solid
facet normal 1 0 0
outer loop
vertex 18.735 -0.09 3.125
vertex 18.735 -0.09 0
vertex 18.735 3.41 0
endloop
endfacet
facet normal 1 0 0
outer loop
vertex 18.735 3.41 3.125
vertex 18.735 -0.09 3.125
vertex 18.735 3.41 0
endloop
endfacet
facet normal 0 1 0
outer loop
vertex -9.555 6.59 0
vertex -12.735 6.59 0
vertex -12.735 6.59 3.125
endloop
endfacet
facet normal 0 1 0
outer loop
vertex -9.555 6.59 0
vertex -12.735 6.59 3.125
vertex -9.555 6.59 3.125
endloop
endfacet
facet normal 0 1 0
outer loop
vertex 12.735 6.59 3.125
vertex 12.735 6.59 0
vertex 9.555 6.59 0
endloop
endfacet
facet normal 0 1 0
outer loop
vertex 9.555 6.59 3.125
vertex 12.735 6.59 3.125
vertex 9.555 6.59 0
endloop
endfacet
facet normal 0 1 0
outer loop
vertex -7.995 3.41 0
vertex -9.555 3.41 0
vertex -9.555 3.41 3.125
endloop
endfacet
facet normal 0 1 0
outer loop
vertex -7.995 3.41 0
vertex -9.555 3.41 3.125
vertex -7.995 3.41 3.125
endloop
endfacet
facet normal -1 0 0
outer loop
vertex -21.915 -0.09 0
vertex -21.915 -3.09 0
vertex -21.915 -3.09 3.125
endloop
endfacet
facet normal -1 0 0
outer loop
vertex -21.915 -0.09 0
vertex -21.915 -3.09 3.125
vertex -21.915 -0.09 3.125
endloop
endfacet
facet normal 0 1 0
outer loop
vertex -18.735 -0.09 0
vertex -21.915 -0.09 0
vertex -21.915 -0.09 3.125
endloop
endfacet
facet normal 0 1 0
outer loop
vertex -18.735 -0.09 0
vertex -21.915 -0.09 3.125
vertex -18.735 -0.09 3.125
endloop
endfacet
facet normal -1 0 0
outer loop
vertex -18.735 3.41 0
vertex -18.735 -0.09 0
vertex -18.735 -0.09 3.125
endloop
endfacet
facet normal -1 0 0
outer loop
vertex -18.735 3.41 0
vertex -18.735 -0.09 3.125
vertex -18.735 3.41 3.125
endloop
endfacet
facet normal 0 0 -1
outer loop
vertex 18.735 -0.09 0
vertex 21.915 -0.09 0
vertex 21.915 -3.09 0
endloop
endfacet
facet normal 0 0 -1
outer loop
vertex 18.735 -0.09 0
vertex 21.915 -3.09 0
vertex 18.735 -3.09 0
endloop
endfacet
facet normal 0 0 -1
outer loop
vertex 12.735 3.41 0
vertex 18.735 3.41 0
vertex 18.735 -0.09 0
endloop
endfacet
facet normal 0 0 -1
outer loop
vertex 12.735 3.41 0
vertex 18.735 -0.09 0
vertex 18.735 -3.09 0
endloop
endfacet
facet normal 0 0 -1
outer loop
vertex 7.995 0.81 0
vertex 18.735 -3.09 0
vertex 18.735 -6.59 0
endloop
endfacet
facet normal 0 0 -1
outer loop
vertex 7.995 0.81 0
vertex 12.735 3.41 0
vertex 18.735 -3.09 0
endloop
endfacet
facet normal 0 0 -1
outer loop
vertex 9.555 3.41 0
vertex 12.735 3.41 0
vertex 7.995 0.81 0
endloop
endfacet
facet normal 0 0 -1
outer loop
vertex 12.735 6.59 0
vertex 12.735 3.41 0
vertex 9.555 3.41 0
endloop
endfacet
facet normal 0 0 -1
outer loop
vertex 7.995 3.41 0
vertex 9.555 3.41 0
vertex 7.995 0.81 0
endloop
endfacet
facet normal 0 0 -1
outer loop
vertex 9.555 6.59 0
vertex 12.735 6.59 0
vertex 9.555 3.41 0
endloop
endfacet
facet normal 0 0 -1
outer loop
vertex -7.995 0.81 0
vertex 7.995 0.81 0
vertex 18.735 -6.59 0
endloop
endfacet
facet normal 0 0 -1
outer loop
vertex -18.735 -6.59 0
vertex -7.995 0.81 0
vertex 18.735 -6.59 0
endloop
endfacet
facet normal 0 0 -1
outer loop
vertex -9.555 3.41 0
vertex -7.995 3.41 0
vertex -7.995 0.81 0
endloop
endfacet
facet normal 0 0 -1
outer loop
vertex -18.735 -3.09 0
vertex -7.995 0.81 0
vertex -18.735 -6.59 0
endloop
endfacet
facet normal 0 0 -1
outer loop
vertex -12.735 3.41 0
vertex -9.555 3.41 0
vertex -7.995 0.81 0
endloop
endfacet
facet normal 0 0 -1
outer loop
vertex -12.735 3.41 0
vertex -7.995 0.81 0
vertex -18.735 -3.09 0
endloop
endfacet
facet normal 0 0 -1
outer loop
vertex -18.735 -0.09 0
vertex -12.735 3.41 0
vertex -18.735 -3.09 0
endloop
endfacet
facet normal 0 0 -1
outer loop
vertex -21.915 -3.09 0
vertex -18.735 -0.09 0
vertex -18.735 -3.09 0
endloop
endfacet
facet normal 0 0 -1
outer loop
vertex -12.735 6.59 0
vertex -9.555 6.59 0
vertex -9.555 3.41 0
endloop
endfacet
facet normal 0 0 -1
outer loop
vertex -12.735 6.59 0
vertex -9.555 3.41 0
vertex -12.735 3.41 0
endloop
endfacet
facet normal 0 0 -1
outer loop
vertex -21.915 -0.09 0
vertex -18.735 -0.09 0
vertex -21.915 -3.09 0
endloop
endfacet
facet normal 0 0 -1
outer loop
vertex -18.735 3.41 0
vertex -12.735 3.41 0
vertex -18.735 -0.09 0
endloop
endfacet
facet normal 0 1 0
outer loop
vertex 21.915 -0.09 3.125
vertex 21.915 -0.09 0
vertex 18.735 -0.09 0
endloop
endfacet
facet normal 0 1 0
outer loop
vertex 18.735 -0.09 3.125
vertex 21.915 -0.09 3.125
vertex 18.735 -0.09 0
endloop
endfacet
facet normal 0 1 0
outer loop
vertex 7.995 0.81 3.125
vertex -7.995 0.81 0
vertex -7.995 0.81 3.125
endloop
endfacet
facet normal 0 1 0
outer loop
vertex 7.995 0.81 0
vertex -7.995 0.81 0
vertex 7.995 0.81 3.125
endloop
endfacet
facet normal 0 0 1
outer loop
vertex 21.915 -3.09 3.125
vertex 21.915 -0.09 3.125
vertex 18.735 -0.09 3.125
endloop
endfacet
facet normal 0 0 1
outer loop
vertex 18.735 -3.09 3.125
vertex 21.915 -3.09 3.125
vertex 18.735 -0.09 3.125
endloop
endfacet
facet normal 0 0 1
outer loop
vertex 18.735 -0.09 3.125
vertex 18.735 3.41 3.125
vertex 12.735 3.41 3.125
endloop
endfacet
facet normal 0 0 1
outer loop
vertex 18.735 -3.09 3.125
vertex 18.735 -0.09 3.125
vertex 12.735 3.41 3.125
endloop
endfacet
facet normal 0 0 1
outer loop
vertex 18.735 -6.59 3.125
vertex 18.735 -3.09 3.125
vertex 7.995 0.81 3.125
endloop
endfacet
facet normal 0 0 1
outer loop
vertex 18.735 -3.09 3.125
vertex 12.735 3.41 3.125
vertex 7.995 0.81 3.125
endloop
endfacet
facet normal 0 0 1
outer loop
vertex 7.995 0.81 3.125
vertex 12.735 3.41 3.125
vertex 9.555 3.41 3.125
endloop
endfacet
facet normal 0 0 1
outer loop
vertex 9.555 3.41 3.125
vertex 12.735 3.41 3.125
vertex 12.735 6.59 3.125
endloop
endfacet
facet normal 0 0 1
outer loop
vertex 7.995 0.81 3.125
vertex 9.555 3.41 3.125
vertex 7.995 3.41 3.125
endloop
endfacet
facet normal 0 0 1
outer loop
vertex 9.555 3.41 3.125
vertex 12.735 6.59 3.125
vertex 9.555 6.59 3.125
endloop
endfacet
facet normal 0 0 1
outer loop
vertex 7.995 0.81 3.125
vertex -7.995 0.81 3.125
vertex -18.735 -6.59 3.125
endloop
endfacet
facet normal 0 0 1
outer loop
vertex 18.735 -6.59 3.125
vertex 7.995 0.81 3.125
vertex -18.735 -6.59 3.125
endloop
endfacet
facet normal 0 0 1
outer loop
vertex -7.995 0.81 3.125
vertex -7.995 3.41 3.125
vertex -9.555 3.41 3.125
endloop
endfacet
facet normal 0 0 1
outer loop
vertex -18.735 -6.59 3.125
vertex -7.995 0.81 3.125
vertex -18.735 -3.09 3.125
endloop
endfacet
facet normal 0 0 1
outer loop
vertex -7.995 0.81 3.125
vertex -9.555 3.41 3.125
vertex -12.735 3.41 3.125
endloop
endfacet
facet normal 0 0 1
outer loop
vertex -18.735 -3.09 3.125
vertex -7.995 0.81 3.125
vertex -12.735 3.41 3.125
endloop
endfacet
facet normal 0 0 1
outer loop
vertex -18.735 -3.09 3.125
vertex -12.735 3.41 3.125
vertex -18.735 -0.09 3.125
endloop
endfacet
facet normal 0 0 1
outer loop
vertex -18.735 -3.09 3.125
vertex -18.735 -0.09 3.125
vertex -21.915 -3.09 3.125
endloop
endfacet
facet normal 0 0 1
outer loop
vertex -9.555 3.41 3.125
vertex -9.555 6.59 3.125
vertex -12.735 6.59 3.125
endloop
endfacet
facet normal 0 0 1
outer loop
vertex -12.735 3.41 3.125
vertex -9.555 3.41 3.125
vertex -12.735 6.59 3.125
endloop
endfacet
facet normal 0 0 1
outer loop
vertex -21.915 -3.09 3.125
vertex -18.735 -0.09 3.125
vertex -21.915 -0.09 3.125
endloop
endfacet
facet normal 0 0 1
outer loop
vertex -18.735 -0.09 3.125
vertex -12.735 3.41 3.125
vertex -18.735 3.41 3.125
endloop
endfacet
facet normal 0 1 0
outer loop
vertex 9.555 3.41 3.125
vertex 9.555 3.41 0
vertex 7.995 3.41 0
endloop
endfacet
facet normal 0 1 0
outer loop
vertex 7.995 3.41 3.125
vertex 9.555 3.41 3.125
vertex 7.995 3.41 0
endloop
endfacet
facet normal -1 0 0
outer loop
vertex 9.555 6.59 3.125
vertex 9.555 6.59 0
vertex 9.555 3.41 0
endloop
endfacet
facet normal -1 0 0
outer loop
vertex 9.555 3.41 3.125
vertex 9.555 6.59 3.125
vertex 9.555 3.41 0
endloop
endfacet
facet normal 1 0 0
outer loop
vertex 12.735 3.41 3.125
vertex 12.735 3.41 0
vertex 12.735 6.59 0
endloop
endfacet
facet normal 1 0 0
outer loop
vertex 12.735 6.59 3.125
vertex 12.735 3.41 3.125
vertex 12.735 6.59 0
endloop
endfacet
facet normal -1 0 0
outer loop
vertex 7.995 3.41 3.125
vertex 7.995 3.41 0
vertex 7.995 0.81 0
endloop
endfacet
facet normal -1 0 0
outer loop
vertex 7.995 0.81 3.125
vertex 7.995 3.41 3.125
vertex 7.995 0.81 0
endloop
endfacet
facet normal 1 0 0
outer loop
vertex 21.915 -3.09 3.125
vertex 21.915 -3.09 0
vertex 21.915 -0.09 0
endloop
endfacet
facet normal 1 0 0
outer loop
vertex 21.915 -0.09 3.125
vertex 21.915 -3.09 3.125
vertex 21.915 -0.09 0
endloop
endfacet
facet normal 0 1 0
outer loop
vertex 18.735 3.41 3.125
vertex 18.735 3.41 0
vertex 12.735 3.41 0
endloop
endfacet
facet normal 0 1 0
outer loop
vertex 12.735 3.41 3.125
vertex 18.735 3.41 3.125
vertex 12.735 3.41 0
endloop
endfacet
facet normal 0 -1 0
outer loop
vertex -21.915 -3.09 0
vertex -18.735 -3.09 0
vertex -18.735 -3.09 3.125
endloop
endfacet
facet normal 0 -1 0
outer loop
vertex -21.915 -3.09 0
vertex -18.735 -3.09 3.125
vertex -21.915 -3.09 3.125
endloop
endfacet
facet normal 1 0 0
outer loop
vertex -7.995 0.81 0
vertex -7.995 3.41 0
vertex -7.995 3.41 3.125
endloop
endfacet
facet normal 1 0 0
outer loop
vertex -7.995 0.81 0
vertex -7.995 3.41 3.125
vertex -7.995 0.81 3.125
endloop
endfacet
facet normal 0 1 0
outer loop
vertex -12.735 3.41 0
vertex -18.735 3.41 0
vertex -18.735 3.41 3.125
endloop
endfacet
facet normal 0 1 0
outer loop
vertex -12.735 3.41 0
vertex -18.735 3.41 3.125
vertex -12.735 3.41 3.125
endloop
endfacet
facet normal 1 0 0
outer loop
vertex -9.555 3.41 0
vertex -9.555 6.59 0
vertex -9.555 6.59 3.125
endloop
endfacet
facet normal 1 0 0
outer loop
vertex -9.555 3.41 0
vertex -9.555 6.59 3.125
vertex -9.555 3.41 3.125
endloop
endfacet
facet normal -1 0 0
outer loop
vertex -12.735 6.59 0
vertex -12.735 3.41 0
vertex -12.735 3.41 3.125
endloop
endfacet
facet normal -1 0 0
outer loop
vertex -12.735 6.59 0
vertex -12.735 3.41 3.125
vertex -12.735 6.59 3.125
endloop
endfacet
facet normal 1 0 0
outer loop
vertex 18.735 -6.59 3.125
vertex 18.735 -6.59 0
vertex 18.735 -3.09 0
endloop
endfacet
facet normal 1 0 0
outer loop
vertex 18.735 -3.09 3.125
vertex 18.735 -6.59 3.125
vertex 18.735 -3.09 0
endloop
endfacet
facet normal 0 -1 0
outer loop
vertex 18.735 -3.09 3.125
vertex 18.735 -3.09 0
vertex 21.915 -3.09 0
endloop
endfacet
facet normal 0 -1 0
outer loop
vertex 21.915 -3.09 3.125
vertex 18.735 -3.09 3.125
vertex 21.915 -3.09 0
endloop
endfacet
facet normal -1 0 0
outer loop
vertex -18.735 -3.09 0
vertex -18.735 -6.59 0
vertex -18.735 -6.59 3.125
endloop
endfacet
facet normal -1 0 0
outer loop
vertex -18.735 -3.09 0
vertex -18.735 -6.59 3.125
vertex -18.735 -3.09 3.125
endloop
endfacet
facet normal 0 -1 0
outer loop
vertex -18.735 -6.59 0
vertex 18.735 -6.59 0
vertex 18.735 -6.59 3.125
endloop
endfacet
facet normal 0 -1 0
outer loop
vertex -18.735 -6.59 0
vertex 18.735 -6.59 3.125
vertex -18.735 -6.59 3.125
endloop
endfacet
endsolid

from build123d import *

# Parameters (mm, degrees)
BOSS_EXTRUDE1_DEPTH = 3.125


with BuildPart() as part:
    # Sketch2 → Boss-Extrude1 (new body)
    with BuildSketch(Plane.XY):
        Polygon((0, -6.59), (18.735, -6.59), (18.735, -3.09), (21.915, -3.09), (21.915, -0.09), (18.735, -0.09), (18.735, 3.41), (12.735, 3.41), (12.735, 6.59), (9.555, 6.59), (9.555, 3.41), (7.995, 3.41), (7.995, 0.81), (0.569270121, 0.81), (0, 0.81), align=None)
    boss_extrude1 = extrude(amount=BOSS_EXTRUDE1_DEPTH)

    # Mirror1: Boss-Extrude1 across plane
    add(boss_extrude1.mirror(Plane(origin=(0, -6.59, 3.125), x_dir=(0, 0, 1), z_dir=(1, 0, 0))))


solid = part.part
